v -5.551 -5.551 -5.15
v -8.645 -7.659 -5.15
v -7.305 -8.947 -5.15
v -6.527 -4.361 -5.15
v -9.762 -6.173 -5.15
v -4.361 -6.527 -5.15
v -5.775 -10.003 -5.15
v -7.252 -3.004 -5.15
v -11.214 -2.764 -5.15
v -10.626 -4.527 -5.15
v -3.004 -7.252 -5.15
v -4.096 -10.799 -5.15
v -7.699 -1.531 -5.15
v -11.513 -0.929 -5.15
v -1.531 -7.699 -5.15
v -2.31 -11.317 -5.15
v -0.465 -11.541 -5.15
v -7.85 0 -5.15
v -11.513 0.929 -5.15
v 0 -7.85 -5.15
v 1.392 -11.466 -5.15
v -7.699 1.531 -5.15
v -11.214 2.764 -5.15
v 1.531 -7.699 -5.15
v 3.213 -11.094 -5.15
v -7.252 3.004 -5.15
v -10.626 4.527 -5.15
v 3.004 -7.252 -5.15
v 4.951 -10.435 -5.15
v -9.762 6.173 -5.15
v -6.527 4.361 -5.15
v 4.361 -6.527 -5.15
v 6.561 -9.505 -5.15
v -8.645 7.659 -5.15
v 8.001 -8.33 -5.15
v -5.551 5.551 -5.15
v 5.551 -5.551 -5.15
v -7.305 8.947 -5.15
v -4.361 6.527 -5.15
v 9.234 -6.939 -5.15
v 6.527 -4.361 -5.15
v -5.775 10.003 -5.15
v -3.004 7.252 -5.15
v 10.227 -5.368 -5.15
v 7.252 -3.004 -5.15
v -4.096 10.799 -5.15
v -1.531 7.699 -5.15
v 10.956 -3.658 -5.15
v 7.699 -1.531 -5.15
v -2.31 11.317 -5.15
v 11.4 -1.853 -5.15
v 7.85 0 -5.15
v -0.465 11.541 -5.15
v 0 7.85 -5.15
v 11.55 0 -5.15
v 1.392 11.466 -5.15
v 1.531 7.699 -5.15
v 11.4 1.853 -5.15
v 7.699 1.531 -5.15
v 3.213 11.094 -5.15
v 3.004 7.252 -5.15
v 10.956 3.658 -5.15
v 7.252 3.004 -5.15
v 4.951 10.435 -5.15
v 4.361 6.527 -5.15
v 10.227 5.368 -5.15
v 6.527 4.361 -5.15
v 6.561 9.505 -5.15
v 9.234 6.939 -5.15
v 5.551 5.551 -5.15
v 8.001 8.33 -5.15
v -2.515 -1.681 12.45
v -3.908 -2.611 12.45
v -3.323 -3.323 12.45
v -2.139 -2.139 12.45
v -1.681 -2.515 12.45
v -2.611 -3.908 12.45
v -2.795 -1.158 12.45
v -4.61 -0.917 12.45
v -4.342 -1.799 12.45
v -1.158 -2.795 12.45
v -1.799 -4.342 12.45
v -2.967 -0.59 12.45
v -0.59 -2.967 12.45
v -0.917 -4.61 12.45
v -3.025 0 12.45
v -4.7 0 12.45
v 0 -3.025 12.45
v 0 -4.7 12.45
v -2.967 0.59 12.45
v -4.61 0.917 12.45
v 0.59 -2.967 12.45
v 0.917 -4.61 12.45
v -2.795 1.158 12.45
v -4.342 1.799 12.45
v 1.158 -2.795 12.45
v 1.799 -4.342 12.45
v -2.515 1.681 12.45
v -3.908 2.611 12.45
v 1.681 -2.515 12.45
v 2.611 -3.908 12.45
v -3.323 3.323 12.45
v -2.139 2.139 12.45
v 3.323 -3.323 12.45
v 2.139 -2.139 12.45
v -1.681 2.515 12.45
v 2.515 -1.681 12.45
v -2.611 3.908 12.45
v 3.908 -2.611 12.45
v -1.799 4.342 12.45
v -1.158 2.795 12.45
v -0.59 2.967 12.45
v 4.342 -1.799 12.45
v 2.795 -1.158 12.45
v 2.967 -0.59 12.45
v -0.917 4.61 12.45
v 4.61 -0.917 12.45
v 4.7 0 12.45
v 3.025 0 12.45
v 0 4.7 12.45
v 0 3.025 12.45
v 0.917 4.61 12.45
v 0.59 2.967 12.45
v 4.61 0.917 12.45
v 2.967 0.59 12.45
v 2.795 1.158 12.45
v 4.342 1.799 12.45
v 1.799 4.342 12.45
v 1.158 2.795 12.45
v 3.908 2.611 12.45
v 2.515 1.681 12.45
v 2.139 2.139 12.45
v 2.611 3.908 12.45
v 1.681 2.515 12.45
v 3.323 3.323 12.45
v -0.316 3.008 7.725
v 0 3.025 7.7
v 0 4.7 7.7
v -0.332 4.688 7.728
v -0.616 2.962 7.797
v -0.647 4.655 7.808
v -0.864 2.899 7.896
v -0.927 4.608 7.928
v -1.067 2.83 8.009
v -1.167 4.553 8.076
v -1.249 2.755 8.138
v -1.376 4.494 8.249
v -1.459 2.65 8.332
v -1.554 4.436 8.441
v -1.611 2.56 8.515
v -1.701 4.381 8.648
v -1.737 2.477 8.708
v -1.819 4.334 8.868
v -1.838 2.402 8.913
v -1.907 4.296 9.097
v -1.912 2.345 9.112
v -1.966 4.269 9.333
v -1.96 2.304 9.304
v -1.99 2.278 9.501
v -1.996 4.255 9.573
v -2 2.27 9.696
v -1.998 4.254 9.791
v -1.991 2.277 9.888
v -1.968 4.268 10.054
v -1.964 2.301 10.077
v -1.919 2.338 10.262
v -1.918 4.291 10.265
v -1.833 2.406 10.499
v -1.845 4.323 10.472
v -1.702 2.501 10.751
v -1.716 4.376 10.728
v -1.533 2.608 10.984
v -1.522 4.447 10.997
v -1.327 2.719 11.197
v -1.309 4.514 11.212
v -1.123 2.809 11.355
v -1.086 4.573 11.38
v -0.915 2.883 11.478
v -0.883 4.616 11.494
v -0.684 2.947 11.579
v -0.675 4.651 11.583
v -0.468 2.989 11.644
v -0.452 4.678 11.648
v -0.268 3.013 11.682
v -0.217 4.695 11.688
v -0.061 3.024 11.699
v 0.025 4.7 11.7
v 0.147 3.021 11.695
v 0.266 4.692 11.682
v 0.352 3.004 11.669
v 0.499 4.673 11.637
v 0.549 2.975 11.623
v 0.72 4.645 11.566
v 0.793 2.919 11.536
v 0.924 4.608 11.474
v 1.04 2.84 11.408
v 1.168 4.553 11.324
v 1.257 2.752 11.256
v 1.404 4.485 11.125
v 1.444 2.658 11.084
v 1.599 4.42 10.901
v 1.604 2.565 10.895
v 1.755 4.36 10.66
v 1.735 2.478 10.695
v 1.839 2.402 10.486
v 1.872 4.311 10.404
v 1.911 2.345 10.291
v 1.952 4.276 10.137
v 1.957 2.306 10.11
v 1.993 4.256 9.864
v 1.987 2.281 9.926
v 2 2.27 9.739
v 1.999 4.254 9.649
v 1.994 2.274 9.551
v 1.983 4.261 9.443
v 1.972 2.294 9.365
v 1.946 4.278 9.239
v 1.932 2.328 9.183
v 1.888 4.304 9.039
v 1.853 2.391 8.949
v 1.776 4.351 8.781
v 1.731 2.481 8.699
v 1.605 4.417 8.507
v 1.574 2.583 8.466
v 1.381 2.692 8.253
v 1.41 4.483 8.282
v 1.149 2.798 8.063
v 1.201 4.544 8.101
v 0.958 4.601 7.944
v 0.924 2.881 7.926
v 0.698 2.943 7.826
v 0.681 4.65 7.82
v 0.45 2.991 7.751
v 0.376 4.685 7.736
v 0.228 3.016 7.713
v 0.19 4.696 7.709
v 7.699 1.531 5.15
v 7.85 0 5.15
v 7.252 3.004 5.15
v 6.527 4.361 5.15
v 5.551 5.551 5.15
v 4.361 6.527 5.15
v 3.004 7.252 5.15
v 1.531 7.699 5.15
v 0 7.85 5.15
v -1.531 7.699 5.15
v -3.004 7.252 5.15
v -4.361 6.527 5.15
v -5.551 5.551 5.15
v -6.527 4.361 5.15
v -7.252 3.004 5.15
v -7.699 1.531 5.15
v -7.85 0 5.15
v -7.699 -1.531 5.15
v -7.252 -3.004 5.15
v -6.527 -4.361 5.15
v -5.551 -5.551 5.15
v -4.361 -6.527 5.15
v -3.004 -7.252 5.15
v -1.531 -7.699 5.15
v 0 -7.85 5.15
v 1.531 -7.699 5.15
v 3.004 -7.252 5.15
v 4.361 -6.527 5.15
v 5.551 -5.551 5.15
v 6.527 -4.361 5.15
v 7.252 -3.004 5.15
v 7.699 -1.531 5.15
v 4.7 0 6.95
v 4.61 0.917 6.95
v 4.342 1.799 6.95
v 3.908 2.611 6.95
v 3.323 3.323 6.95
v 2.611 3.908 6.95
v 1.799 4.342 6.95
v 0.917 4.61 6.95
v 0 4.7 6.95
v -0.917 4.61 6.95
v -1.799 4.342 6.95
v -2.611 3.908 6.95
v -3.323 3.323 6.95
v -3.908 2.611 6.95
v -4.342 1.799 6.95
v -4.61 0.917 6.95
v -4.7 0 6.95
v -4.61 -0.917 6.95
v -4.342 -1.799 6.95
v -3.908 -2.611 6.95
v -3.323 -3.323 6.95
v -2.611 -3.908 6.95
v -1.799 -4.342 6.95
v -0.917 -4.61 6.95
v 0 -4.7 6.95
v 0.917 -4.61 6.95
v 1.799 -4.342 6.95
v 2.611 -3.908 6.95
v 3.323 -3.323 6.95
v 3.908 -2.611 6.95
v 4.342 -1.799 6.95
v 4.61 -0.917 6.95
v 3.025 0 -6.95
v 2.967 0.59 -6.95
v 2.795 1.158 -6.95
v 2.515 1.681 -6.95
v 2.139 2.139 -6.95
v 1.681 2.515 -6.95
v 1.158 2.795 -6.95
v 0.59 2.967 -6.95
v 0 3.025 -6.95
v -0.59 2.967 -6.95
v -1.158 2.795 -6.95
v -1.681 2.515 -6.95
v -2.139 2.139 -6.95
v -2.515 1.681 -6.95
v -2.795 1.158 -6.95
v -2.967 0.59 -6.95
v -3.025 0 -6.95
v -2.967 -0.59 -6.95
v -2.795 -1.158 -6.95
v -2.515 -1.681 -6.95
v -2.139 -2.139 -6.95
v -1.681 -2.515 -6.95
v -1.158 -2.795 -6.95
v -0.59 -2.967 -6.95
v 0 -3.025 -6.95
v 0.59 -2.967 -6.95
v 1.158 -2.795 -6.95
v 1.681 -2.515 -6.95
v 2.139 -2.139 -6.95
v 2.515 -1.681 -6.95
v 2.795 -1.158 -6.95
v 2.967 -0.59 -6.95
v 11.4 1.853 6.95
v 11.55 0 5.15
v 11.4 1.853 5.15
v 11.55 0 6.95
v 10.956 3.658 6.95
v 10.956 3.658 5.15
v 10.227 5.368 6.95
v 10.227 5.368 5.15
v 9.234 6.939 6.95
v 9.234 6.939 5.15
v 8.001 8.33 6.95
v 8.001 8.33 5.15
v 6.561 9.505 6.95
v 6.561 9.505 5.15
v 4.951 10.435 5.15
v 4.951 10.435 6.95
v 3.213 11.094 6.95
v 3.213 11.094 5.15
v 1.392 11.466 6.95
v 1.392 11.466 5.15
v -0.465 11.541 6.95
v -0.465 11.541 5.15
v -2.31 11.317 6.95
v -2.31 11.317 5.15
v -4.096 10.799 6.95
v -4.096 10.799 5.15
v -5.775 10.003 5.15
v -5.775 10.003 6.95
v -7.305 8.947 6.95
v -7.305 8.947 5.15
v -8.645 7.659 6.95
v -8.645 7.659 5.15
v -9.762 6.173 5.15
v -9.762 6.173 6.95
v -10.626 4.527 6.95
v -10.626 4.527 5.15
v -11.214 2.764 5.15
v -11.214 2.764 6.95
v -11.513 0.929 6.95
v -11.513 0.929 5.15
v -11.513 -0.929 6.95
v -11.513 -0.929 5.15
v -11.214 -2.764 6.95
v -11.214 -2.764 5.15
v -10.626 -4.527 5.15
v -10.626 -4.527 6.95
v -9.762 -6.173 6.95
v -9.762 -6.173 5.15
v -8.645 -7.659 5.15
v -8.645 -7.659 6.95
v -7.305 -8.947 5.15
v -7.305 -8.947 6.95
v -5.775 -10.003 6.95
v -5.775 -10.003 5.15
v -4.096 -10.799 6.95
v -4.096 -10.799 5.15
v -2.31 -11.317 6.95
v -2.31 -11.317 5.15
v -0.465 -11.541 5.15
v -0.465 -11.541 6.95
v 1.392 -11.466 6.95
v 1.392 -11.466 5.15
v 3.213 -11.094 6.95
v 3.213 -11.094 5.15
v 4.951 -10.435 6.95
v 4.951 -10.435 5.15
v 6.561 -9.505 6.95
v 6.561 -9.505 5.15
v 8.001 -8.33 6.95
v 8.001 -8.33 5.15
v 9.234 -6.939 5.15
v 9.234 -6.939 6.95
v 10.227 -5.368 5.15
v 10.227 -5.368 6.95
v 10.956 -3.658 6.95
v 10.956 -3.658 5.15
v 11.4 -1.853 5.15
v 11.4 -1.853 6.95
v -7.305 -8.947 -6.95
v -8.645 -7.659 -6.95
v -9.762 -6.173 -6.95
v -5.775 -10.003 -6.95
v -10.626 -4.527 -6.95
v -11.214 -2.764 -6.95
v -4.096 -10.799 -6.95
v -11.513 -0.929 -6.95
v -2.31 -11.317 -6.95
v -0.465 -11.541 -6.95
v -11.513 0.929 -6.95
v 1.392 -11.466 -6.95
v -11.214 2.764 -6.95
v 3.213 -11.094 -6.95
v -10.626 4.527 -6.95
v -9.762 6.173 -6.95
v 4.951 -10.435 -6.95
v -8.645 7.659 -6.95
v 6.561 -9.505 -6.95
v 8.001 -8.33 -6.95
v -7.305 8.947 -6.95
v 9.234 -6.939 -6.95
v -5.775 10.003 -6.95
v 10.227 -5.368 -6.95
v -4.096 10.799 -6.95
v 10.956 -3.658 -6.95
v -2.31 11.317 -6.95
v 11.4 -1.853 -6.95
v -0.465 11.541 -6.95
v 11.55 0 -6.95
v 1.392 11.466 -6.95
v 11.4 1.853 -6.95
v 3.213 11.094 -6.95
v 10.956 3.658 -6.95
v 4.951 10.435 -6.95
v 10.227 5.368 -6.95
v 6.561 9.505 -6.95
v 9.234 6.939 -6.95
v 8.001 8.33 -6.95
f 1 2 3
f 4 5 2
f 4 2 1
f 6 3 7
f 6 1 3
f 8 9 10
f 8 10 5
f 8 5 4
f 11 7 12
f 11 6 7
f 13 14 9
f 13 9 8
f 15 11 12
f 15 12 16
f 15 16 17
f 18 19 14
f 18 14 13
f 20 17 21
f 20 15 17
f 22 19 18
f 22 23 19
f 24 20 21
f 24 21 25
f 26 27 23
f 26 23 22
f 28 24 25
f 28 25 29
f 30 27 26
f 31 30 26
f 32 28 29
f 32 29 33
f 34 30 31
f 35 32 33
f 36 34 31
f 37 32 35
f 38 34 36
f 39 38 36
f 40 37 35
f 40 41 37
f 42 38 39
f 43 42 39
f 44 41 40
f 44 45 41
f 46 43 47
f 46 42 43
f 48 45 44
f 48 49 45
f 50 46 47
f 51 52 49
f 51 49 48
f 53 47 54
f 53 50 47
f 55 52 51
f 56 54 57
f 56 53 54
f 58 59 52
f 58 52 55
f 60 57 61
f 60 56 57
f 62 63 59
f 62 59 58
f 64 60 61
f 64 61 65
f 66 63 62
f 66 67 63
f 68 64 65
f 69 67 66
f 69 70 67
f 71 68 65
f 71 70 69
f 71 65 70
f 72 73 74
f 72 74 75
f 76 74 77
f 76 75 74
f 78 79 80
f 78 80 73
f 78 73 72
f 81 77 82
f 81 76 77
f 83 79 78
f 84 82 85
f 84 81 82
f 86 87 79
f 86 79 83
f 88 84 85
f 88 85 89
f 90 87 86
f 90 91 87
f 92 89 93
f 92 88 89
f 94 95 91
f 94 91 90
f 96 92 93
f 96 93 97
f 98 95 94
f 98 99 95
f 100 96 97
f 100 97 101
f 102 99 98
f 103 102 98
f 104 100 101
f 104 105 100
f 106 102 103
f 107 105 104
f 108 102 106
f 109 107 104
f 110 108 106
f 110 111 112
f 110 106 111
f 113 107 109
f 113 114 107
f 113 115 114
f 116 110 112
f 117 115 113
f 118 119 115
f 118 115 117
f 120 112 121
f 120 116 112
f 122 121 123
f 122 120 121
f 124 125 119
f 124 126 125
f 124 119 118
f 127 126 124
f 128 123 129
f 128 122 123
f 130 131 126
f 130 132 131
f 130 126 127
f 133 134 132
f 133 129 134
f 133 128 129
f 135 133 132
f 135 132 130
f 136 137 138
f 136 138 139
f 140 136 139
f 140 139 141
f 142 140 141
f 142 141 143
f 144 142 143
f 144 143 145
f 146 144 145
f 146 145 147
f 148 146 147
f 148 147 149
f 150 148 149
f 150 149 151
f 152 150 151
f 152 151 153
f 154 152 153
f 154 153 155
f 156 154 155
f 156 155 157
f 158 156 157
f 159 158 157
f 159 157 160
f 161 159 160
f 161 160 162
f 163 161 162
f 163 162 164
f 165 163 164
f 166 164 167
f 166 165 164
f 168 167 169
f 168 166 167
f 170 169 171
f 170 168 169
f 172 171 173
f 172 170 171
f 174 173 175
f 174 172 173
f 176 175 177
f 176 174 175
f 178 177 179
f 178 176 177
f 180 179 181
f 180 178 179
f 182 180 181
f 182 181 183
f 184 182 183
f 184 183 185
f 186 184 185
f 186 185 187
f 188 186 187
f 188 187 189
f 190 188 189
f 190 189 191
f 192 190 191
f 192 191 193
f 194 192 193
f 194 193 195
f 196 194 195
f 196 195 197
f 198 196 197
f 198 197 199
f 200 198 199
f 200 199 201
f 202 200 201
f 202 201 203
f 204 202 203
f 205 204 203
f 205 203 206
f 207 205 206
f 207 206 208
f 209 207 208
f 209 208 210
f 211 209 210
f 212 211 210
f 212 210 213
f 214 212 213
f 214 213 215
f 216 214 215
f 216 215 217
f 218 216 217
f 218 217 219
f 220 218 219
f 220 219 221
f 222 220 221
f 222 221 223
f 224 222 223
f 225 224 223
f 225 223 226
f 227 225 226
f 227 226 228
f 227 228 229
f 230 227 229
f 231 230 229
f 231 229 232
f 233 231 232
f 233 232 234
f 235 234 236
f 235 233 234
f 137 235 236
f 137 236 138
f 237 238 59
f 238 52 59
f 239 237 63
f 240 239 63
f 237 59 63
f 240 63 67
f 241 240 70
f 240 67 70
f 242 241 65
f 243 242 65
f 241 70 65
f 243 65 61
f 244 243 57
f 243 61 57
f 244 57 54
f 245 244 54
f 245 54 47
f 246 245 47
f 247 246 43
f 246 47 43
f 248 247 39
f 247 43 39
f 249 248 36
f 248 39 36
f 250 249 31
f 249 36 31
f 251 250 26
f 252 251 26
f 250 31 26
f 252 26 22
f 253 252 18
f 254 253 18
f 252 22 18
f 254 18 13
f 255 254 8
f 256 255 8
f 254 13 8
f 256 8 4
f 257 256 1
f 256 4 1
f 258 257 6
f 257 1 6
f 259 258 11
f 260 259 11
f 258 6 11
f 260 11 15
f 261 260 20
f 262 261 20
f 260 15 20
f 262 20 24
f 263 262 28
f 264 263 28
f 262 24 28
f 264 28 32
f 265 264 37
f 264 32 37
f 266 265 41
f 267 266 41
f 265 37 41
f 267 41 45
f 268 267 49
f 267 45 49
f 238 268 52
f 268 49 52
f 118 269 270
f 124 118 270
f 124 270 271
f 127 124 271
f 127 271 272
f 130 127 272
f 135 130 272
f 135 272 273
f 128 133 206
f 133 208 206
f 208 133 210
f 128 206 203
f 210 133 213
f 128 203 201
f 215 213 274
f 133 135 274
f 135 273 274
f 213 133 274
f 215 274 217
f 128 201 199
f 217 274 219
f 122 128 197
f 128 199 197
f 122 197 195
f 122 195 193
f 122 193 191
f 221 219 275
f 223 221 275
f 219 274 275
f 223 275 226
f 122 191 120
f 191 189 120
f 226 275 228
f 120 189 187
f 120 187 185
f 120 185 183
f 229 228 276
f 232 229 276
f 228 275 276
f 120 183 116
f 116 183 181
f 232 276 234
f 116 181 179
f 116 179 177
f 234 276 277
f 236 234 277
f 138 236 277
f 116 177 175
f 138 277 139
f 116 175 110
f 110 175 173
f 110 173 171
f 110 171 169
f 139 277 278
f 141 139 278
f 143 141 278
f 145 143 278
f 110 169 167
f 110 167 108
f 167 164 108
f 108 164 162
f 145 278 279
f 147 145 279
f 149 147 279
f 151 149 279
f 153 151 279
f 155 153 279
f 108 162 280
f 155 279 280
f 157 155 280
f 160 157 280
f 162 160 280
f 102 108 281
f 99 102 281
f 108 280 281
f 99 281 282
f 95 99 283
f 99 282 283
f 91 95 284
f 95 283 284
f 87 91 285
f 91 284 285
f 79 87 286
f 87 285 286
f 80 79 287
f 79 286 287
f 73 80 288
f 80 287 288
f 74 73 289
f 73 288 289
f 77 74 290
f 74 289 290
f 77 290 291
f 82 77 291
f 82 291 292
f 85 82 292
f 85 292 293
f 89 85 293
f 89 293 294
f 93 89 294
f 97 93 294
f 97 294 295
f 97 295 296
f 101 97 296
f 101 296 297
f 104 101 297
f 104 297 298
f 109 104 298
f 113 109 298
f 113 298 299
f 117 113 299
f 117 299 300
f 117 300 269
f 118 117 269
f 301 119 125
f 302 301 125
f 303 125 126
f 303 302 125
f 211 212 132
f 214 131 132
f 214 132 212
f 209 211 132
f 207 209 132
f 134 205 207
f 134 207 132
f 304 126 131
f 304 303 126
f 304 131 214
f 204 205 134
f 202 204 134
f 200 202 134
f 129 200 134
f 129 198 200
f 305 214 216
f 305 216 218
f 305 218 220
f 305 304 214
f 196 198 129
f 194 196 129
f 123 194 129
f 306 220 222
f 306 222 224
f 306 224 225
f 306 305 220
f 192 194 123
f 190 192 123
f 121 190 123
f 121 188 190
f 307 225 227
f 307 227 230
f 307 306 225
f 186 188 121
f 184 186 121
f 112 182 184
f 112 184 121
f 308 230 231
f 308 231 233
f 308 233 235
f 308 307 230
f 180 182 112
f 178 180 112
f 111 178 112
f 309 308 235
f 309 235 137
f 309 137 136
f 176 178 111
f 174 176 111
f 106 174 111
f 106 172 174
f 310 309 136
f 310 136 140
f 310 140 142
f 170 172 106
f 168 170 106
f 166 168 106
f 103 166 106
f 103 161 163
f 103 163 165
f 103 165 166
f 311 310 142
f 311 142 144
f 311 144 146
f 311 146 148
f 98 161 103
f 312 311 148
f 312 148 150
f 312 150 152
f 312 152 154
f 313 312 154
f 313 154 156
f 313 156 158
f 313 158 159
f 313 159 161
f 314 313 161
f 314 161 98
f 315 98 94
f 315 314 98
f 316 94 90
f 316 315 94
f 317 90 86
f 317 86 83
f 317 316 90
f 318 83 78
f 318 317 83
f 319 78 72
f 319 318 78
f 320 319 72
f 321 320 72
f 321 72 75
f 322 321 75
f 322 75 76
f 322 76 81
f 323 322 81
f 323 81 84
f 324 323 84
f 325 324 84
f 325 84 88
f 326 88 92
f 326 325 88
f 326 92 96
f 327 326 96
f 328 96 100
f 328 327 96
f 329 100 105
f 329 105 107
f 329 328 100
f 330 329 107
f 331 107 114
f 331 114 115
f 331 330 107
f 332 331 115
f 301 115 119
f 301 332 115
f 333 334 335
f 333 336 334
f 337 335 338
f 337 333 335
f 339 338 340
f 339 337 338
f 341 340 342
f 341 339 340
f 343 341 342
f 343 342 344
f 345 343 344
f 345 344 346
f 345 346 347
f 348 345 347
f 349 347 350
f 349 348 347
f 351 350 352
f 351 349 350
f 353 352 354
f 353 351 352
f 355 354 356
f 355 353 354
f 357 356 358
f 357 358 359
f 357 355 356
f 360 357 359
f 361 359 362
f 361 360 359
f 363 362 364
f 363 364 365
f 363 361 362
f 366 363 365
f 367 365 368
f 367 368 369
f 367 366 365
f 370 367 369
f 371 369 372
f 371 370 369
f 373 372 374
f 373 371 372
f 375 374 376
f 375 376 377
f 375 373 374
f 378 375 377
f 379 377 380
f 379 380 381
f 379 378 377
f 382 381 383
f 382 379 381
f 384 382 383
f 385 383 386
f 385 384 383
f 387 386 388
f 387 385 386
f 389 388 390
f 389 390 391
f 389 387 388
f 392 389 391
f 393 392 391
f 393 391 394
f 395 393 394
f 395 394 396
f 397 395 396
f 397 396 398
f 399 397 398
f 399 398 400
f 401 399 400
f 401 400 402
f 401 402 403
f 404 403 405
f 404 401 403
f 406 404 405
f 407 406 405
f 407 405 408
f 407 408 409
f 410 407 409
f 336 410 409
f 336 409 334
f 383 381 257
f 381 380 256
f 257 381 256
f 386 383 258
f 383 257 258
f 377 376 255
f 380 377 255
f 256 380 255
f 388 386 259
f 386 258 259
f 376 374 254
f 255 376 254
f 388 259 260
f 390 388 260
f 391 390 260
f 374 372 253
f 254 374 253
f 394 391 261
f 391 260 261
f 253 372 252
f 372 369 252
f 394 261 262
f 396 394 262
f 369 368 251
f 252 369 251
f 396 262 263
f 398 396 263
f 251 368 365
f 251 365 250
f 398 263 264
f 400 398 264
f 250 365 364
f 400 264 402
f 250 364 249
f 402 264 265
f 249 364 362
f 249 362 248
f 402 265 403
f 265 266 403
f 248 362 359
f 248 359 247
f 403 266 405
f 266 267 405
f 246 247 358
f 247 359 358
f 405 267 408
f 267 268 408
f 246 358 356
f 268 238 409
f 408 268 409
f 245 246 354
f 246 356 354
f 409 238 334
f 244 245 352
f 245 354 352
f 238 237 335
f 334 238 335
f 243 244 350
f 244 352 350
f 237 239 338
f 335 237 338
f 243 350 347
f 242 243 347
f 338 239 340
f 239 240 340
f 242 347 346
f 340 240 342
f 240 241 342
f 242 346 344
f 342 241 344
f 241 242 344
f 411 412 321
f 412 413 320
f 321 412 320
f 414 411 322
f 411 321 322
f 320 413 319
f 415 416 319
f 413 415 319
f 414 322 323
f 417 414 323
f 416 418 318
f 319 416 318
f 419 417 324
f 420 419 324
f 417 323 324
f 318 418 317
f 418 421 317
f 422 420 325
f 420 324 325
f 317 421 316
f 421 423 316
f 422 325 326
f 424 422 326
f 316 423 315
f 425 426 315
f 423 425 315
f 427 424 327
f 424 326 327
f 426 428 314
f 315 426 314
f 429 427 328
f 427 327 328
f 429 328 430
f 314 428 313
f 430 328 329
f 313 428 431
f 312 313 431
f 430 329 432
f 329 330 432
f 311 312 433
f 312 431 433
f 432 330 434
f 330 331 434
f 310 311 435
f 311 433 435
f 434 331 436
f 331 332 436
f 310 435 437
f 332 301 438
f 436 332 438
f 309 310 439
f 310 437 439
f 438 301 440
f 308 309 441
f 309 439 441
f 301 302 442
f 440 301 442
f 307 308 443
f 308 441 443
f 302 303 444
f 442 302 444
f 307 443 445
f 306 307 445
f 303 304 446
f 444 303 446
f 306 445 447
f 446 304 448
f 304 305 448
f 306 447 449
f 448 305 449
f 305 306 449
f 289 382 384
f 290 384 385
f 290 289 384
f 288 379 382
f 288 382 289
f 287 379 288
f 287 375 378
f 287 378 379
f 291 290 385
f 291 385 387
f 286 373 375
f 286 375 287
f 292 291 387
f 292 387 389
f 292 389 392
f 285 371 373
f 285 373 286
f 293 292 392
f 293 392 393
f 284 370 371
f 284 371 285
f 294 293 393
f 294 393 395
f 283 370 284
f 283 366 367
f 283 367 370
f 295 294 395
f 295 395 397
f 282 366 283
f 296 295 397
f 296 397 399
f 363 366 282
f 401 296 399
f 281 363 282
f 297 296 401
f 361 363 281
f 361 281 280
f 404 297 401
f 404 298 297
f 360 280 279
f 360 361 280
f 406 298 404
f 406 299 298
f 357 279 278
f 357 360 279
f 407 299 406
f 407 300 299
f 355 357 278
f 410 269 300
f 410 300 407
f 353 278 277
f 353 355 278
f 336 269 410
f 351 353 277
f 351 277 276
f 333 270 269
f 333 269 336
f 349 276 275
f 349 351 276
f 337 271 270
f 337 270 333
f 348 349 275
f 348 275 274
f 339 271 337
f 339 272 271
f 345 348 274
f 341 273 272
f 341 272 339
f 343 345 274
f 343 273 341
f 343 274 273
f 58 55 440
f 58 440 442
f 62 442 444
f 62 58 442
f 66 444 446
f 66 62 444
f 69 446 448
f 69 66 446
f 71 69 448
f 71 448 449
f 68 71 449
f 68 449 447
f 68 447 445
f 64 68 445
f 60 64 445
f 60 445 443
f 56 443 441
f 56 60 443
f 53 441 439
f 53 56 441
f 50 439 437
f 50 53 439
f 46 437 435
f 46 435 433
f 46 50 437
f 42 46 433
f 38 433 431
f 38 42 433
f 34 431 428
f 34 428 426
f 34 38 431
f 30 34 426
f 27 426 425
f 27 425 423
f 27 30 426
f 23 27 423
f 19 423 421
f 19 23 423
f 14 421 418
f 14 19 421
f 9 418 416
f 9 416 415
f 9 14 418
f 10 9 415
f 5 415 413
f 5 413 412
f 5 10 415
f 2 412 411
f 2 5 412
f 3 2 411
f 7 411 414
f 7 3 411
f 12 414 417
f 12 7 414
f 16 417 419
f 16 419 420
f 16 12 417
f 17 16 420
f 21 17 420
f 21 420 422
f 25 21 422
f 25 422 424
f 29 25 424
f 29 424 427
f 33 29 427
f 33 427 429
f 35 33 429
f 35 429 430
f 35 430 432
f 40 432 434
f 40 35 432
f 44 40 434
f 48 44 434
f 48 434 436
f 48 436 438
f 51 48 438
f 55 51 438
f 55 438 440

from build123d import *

# Parameters (mm, degrees)
ESQUISSE1_R             = 11.55
ESQUISSE1_R_2           = 3.025
BOSS_EXTRU_1_DEPTH      = 6.95
ESQUISSE2_R             = 13.660407535
ESQUISSE2_R_2           = 7.85
ENL_V_MAT_EXTRU_1_DEPTH = 5.15
ESQUISSE4_R             = 4.7
ESQUISSE4_R_2           = 3.025
BOSS_EXTRU_2_DEPTH      = 5.5
ESQUISSE5_R             = 2
ENL_V_MAT_EXTRU_3_DEPTH = 21.537952673


with BuildPart() as part:
    # Esquisse1 → Boss.-Extru.1 (new, symmetric)
    with BuildSketch(Plane.XY):
        Circle(ESQUISSE1_R)
        Circle(ESQUISSE1_R_2, mode=Mode.SUBTRACT)
    extrude(amount=BOSS_EXTRU_1_DEPTH, both=True)

    # Esquisse2 → Enlèv. mat.-Extru.1 (cut, symmetric)
    with BuildSketch(Plane.XY):
        Circle(ESQUISSE2_R)
        Circle(ESQUISSE2_R_2, mode=Mode.SUBTRACT)
    extrude(amount=ENL_V_MAT_EXTRU_1_DEPTH, both=True, mode=Mode.SUBTRACT)

    # Esquisse4 → Boss.-Extru.2 (add)
    with BuildSketch(Plane.XY.offset(6.95)):
        Circle(ESQUISSE4_R)
        Circle(ESQUISSE4_R_2, mode=Mode.SUBTRACT)
    extrude(amount=BOSS_EXTRU_2_DEPTH)

    # Esquisse5 → Enlèv. mat.-Extru.3 (cut, through all)
    with BuildSketch(Plane(origin=(0, 0, 0), x_dir=(1, 0, 0), z_dir=(0, 1, 0))):
        with Locations(Location((0, -9.7, 0), (0, 0, 90))):
            Circle(ESQUISSE5_R)
    extrude(amount=ENL_V_MAT_EXTRU_3_DEPTH, mode=Mode.SUBTRACT)


solid = part.part
